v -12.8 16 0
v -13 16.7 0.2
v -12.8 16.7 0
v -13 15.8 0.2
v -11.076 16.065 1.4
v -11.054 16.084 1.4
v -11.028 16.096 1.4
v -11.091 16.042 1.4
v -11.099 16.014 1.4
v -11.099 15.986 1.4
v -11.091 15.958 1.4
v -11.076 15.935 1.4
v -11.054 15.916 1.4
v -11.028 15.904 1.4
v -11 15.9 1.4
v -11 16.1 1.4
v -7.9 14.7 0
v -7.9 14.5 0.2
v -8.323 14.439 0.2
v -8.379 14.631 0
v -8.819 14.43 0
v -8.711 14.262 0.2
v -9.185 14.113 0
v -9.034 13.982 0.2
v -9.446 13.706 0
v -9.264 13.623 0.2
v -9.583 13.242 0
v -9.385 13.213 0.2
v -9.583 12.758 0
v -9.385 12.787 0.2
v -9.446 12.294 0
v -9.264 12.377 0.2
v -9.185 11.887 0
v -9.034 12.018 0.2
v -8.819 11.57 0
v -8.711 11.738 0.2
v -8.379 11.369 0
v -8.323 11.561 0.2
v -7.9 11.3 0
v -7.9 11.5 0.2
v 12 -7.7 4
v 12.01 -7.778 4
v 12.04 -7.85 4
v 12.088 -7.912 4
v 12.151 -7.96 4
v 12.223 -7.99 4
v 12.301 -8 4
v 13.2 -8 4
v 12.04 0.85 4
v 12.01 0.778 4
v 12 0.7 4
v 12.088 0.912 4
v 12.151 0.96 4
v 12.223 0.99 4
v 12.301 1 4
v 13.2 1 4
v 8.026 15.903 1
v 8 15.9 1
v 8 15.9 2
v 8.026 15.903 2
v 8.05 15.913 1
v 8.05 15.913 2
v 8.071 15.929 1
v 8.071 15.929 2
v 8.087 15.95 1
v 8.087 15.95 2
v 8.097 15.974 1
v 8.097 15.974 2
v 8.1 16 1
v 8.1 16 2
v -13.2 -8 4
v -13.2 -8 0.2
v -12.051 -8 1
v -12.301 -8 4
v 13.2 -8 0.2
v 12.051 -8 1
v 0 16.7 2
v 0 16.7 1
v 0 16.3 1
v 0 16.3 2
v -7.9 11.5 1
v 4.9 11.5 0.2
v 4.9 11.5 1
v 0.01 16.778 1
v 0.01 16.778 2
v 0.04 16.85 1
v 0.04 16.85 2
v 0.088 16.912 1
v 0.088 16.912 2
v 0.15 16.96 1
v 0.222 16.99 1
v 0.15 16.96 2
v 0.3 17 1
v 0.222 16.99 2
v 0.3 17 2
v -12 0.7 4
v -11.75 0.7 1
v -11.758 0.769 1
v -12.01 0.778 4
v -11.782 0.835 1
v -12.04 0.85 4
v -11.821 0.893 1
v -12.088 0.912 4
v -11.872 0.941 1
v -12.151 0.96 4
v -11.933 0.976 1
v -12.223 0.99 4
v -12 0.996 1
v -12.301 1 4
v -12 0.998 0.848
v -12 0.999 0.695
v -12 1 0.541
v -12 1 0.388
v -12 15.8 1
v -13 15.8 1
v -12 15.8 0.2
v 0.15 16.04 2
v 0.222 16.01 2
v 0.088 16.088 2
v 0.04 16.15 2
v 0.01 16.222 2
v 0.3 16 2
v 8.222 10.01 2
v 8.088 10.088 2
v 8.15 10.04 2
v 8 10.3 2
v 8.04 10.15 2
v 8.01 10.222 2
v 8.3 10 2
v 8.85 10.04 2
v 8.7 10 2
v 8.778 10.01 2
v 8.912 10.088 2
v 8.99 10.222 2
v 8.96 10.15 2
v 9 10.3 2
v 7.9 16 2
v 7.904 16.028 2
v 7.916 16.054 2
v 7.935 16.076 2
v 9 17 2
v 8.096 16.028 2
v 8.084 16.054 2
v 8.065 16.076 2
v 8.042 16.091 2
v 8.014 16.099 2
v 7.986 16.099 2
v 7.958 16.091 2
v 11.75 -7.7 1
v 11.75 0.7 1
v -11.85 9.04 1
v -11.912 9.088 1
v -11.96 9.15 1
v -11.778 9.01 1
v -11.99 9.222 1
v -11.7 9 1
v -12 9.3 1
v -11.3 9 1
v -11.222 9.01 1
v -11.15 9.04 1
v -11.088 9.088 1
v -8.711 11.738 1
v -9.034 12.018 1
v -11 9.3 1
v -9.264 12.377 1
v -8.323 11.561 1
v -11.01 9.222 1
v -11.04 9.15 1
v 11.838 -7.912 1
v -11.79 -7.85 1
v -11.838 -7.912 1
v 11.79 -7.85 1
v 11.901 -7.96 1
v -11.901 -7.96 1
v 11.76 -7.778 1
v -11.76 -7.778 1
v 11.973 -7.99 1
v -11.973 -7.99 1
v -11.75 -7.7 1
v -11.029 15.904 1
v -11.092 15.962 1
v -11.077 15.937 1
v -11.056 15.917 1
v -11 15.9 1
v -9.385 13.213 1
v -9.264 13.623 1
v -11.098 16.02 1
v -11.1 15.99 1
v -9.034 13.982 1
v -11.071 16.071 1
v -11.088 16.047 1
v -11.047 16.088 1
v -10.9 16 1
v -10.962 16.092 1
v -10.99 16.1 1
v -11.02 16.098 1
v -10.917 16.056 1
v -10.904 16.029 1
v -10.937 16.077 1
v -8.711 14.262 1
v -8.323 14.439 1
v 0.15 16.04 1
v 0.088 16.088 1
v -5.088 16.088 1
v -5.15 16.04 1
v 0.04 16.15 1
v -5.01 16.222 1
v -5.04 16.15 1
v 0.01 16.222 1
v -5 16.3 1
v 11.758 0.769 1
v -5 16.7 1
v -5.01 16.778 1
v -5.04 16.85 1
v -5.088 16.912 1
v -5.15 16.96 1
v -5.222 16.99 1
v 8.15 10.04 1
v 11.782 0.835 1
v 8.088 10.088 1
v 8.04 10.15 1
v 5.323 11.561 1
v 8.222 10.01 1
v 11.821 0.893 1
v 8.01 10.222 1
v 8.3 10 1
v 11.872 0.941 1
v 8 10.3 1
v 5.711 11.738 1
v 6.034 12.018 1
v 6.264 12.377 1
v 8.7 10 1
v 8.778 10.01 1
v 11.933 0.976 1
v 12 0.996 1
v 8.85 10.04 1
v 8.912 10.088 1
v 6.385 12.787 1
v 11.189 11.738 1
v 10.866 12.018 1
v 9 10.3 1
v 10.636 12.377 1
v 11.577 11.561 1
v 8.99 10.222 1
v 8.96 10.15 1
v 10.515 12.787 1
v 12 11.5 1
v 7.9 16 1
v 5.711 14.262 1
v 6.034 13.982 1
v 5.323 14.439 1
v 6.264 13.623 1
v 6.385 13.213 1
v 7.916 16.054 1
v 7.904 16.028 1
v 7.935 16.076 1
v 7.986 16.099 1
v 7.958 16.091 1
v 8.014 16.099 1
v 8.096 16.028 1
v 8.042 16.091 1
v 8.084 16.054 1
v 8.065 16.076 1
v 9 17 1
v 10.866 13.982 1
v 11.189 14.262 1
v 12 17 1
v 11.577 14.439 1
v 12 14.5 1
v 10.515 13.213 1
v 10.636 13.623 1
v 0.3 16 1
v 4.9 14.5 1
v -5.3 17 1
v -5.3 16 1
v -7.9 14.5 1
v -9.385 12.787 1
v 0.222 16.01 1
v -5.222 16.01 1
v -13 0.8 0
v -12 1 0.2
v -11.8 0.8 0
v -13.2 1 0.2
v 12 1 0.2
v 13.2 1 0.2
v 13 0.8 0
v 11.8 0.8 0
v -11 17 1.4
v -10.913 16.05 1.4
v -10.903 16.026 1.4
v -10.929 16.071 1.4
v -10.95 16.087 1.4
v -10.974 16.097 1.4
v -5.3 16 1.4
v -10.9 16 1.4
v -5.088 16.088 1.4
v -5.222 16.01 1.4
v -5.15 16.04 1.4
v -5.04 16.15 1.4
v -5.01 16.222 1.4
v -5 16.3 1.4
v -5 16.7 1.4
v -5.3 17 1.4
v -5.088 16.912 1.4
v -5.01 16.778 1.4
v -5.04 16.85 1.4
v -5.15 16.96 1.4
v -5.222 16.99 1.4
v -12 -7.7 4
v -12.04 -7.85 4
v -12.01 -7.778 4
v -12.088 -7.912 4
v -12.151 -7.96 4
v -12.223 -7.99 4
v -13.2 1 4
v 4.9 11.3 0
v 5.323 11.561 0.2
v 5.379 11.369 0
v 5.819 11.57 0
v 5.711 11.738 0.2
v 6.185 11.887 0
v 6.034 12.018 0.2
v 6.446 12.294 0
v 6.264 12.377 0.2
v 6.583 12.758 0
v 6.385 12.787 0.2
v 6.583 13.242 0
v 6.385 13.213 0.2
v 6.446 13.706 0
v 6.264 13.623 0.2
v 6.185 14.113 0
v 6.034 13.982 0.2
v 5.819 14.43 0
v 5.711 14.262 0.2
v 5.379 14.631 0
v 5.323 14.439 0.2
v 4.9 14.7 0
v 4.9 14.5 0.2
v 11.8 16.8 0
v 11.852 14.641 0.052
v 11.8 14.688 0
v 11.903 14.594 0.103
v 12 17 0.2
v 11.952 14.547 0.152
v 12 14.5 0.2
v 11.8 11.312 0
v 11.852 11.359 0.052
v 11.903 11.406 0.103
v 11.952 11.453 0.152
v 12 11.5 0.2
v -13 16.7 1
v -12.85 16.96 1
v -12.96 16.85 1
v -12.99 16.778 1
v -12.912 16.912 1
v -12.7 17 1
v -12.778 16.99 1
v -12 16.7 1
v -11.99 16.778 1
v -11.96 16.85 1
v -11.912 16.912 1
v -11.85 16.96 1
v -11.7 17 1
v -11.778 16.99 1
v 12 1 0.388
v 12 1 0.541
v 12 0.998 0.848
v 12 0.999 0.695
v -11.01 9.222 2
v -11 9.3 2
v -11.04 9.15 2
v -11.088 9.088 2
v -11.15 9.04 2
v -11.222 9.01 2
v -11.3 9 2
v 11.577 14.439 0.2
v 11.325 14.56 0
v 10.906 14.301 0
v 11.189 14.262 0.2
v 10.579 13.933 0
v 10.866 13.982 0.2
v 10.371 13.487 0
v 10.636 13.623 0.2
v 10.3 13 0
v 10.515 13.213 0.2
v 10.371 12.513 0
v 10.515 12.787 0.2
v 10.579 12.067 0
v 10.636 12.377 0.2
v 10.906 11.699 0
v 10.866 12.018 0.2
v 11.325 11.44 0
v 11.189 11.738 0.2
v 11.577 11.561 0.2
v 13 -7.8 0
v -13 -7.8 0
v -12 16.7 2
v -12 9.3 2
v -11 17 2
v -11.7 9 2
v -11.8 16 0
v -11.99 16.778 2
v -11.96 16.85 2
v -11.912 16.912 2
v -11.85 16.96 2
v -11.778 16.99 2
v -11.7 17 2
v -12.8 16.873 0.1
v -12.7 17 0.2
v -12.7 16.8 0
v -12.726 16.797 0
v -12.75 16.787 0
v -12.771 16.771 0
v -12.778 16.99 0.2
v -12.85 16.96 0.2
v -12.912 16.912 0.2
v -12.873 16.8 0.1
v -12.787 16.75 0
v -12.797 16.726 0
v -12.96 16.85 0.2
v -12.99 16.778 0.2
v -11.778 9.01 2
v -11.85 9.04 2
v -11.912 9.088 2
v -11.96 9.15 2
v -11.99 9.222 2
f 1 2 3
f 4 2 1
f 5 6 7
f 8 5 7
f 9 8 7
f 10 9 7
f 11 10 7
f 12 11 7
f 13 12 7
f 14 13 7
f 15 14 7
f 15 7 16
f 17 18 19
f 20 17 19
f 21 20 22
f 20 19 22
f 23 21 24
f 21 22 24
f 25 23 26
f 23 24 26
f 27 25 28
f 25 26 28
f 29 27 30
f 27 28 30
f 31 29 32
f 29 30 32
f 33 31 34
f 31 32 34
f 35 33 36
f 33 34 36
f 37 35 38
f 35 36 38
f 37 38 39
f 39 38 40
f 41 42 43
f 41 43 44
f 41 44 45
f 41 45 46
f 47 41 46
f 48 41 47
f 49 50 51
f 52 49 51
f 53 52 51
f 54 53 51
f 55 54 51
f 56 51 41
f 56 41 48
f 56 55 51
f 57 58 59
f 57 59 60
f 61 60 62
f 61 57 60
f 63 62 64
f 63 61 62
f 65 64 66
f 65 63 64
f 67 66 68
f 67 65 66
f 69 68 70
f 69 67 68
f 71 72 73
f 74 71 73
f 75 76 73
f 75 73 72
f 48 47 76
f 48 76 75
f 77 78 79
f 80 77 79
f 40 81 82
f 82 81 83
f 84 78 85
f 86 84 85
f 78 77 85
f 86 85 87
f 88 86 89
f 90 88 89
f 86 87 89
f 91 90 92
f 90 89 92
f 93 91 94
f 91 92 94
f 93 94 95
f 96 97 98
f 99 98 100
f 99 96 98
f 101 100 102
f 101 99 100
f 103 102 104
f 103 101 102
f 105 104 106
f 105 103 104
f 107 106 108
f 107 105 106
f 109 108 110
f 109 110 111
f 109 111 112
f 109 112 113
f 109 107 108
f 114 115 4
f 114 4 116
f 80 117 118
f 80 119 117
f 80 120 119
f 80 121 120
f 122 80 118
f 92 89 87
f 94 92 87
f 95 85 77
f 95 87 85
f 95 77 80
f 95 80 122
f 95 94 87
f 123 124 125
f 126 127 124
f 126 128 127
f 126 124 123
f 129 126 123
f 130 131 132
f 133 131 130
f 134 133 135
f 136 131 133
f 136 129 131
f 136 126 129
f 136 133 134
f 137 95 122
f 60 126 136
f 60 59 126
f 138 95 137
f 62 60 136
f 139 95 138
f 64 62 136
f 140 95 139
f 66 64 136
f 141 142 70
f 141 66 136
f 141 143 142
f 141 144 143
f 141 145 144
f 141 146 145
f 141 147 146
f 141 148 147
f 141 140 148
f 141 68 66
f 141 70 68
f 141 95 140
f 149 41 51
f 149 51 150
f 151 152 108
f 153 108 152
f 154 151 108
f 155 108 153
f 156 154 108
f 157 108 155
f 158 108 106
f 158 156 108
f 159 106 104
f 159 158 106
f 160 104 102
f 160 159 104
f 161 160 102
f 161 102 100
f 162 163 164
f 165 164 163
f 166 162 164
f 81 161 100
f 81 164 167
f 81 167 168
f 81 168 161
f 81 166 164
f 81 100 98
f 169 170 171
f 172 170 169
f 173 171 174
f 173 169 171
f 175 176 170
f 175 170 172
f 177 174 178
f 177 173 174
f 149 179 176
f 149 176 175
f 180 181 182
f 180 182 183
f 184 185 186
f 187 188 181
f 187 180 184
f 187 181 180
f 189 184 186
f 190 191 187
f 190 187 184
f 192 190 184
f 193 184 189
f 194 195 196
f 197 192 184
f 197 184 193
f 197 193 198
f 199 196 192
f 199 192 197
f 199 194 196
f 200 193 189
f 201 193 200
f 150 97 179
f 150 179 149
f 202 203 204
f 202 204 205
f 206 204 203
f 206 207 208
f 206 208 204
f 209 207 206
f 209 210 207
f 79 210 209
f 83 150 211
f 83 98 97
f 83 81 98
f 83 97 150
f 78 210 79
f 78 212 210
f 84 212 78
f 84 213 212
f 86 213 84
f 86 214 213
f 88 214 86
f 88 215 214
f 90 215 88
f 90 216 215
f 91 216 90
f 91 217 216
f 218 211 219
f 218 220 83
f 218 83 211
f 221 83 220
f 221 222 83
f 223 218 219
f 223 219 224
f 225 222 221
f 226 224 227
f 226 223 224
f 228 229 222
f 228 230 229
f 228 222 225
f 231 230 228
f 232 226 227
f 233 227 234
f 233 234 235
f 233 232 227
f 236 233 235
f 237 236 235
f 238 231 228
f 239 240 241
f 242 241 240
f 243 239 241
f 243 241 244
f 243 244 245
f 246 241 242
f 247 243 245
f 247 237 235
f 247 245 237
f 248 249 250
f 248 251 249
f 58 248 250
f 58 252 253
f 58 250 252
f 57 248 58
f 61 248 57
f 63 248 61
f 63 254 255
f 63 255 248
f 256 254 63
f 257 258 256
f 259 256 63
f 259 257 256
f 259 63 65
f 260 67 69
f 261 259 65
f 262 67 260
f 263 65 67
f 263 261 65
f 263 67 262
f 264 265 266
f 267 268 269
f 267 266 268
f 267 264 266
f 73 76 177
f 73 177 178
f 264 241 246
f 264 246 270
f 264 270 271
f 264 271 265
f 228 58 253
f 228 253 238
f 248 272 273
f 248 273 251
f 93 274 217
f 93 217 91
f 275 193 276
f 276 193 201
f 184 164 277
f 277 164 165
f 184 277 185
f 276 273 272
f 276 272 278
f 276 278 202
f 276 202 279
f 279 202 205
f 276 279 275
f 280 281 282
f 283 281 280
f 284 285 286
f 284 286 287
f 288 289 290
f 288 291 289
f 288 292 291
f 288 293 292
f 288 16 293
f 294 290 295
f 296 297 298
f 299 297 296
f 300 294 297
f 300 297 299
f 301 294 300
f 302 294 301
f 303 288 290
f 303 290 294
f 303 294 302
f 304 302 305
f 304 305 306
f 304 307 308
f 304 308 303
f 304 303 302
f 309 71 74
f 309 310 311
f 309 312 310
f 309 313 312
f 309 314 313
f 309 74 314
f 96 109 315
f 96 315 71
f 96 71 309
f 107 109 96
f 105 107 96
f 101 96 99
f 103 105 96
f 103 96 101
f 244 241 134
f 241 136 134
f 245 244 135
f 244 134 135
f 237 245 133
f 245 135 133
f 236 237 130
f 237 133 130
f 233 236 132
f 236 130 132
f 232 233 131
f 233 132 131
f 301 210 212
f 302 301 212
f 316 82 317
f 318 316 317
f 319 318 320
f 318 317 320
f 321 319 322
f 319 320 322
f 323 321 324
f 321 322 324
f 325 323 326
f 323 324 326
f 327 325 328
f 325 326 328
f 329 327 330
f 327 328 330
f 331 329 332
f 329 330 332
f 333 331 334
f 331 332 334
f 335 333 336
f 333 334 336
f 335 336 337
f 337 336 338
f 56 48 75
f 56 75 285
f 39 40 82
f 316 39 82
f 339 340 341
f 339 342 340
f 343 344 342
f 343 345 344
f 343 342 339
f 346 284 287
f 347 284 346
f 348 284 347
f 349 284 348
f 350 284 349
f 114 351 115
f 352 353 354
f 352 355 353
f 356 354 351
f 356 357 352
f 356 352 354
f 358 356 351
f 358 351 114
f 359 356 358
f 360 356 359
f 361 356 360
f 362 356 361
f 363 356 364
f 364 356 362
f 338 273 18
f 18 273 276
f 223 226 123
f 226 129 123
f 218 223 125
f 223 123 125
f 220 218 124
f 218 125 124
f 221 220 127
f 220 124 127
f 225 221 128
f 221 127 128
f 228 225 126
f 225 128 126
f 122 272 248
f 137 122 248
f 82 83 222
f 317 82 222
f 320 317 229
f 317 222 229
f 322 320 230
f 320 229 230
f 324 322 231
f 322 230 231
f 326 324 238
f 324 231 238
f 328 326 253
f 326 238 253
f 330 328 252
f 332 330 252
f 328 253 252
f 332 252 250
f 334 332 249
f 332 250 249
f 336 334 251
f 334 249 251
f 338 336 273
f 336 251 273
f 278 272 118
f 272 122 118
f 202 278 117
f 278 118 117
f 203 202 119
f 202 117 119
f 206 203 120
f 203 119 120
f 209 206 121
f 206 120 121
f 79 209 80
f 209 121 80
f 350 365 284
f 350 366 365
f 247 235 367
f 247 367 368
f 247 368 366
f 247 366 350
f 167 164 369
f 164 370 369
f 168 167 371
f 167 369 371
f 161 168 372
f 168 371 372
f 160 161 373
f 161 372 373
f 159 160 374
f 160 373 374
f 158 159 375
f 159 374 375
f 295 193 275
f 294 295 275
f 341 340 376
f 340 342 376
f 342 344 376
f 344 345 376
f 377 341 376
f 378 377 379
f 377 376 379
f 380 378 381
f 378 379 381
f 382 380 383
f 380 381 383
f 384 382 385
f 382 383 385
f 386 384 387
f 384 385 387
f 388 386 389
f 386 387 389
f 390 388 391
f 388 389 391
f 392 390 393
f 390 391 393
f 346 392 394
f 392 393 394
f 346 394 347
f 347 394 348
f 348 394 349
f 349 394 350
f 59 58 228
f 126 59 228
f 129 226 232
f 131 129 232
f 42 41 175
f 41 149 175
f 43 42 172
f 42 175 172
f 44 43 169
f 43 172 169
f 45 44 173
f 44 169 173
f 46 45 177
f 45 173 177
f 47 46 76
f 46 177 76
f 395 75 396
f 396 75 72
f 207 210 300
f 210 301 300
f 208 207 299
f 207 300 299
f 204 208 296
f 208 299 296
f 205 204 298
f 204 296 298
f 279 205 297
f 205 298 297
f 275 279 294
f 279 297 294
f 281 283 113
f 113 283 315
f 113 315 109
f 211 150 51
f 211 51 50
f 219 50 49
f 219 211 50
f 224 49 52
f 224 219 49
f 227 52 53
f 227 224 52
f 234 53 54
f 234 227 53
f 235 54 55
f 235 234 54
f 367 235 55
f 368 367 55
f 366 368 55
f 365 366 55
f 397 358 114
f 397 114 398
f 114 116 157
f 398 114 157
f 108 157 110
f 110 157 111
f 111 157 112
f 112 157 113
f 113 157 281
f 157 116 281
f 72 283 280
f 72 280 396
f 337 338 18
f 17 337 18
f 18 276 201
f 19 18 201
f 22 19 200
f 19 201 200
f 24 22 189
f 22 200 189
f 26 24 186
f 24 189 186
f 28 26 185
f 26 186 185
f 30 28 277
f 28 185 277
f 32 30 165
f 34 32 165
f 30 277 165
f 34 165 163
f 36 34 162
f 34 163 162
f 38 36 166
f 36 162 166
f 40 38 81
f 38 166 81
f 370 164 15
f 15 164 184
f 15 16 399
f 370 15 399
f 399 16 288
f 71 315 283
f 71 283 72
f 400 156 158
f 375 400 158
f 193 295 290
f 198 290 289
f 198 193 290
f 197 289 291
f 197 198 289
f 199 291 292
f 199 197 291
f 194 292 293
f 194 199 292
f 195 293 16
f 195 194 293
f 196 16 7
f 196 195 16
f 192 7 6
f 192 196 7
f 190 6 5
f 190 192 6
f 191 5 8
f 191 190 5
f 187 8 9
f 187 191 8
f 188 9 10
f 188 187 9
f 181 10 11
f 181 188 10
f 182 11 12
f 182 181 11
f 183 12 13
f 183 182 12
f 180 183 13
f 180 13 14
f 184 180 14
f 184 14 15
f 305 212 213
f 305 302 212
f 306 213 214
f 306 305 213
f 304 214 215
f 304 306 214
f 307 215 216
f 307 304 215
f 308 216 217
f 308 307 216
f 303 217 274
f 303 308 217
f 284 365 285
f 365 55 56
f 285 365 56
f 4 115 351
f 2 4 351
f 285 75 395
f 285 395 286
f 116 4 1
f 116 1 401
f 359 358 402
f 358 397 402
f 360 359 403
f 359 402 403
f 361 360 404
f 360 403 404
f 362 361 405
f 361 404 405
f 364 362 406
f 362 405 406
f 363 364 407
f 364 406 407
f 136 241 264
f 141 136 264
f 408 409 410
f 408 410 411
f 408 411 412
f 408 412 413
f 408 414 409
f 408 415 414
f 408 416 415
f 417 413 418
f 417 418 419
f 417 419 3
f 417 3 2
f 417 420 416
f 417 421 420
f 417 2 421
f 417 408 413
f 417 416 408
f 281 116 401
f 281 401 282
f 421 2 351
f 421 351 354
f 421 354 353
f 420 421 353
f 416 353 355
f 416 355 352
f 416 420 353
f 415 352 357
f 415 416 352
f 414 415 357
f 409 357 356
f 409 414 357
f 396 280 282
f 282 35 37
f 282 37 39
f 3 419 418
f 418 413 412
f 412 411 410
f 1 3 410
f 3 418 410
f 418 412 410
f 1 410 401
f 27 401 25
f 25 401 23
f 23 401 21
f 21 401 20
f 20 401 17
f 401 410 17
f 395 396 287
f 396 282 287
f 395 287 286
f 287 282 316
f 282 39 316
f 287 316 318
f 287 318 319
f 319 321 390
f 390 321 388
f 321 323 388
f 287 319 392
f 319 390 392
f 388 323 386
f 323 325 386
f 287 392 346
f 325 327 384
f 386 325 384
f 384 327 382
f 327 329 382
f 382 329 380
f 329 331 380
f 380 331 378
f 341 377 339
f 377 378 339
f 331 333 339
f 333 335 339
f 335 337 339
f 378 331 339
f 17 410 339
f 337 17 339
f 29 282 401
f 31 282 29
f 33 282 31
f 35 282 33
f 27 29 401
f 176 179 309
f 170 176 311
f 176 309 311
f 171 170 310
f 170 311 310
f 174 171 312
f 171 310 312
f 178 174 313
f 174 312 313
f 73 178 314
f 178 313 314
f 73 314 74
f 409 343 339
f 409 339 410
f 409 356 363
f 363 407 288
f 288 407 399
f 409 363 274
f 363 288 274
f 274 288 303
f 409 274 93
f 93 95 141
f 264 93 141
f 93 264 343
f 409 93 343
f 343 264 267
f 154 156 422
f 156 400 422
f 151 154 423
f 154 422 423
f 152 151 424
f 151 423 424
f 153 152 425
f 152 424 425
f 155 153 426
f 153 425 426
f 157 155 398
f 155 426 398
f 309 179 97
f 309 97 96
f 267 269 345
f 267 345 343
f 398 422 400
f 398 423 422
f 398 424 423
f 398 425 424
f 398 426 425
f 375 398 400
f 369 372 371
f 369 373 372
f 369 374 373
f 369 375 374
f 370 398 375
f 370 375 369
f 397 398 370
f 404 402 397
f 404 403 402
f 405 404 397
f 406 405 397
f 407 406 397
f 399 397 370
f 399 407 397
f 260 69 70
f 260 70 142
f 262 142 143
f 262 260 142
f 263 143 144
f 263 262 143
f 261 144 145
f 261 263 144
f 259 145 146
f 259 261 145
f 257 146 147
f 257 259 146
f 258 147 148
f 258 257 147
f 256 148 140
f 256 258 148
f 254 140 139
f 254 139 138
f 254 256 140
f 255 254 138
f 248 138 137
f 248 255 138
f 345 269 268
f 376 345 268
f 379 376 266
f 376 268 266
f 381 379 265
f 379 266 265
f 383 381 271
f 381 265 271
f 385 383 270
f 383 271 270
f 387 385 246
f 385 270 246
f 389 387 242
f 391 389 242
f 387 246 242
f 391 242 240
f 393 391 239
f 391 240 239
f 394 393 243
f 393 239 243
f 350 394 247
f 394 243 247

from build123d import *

# Parameters (mm, degrees)
F0_W      = 1.2
F0_H      = 9
F5_DEPTH  = 9
F7_DEPTH  = 1
F6_W      = 6
F6_H      = 1
F8_DEPTH  = 0.4
F9_DEPTH  = 1
F6_W_2    = 1
F6_H_2    = 1.2
F10_DEPTH = 1
F11_R     = 0.3
F13_DEPTH = 1
F14_DEPTH = 0.4
F15_SIZE  = 0.2


with BuildPart() as f2:
    # F2: sweep along a path in F1
    with BuildLine(Plane.XZ) as f2_path:
        Line((0, 0), (0, 1))
    # F0 (on Top) → F2 (sweep)
    with BuildSketch(Plane.XY):
        Polygon((-12, -8), (12, -8), (12, 1), (12, 8), (12, 9), (12, 17), (-12, 17), (-12, 9), (-12, 8), (-12, 1), align=None)
        with Locations((-12.6, -3.5)):
            Rectangle(F0_W, F0_H)
        with Locations((12.6, -3.5)):
            Rectangle(F0_W, F0_H)
    sweep(path=f2_path.line)

    # F3: sweep along a path in F1
    with BuildLine(Plane.XZ) as f3_path:
        Line((0, 0), (0, 1))
        Line((0, 1), (0, 4))
    # F0 (on Top) → F3 (sweep)
    with BuildSketch(Plane.XY):
        with Locations((-12.6, -3.5)):
            Rectangle(F0_W, F0_H)
        with Locations((12.6, -3.5)):
            Rectangle(F0_W, F0_H)
    sweep(path=f3_path.line)

    # F4 (on face) → F5 (join, through all)
    with BuildSketch(Plane.XZ.offset(8)):
        Polygon((-11.75, 1), (-12, 4), (-12, 1), align=None)
        Polygon((12, 1), (12, 4), (11.75, 1), align=None)
    extrude(amount=-F5_DEPTH)

    # F6 (on face) → F7 (join)
    with BuildSketch(Plane.XY.offset(1)):
        Polygon((-11, 17), (-12, 17), (-12, 15.8), (-12, 9), (-11, 9), (-11, 16), align=None)
        Polygon((9, 17), (0, 17), (0, 16), (8, 16), (8, 10), (9, 10), align=None)
    extrude(amount=F7_DEPTH)

    # F6 (on face) → F8 (join)
    with BuildSketch(Plane.XY.offset(1)):
        with Locations((-8, 16.5)):
            Rectangle(F6_W, F6_H)
    extrude(amount=F8_DEPTH)

    # F6 (on face) → F9 (cut, through all)
    with BuildSketch(Plane.XY.offset(1)):
        with BuildLine():
            ThreePointArc((-7.9, 14.5), (-9.4, 13), (-7.9, 11.5))
            Line((-7.9, 11.5), (4.9, 11.5))
            ThreePointArc((4.9, 11.5), (6.4, 13), (4.9, 14.5))
            Line((4.9, 14.5), (-7.9, 14.5))
        make_face()
        with BuildLine():
            Line((12, 11.5), (12, 14.5))
            ThreePointArc((12, 14.5), (10.5, 13), (12, 11.5))
        make_face()
    extrude(amount=-F9_DEPTH, mode=Mode.SUBTRACT)

    # F6 (on face) → F10 (join, through all)
    with BuildSketch(Plane.XY.offset(1)):
        with Locations((-12.5, 16.4)):
            Rectangle(F6_W_2, F6_H_2)
    extrude(amount=-F10_DEPTH)

    # F11
    f11_edges = [f2.edges().sort_by_distance(p)[0] for p in [
        (-11.875, -8, 2.5),
        (-11.875, 1, 2.5),
        (11.875, -8, 2.5),
        (-11, 9, 1.5),
        (0, 16, 1.5),
        (0, 17, 1.5),
        (8, 10, 1.5),
        (9, 10, 1.5),
        (-12, 9, 1.5),
        (-12, 17, 1.5),
        (-13, 17, 0.5),
        (-5, 16, 1.2),
        (-5, 17, 1.2),
        (11.875, 1, 2.5),
    ]]
    fillet(f11_edges, radius=F11_R)

    # F12 (on face) → F13 (cut, through all)
    with BuildSketch(Plane.XY.offset(1)):
        with BuildLine():
            ThreePointArc((8, 15.9), (8.0707106781, 15.9292893219), (8.1, 16))
            ThreePointArc((8.1, 16), (8, 16.1), (7.9, 16))
            Line((7.9, 16), (8, 16))
            Line((8, 16), (8, 15.9))
        make_face()
    extrude(amount=F13_DEPTH, mode=Mode.SUBTRACT)

    # F12 (on face) → F14 (cut, through all)
    with BuildSketch(Plane.XY.offset(1)):
        with BuildLine():
            Line((-11, 16), (-10.9, 16))
            ThreePointArc((-10.9, 16), (-11.0707106781, 16.0707106781), (-11, 15.9))
            Line((-11, 15.9), (-11, 16))
        make_face()
    extrude(amount=F14_DEPTH, mode=Mode.SUBTRACT)

    # F15
    f15_edges = [f2.edges().sort_by_distance(p)[0] for p in [
        (-0.35, 17, 0),
        (-12.912132, 16.912132, 0),
        (12, 15.75, 0),
        (-13, 16.25, 0),
        (10.5, 13, 0),
        (-12.5, 15.8, 0),
        (12, 6.25, 0),
        (-12, 8.4, 0),
        (12.6, 1, 0),
        (-12.6, 1, 0),
        (13.2, -3.5, 0),
        (-13.2, -3.5, 0),
        (0, -8, 0),
        (-9.4, 13, 0),
        (-1.5, 14.5, 0),
        (6.4, 13, 0),
        (-1.5, 11.5, 0),
    ]]
    chamfer(f15_edges, length=F15_SIZE)


solid = f2.part
